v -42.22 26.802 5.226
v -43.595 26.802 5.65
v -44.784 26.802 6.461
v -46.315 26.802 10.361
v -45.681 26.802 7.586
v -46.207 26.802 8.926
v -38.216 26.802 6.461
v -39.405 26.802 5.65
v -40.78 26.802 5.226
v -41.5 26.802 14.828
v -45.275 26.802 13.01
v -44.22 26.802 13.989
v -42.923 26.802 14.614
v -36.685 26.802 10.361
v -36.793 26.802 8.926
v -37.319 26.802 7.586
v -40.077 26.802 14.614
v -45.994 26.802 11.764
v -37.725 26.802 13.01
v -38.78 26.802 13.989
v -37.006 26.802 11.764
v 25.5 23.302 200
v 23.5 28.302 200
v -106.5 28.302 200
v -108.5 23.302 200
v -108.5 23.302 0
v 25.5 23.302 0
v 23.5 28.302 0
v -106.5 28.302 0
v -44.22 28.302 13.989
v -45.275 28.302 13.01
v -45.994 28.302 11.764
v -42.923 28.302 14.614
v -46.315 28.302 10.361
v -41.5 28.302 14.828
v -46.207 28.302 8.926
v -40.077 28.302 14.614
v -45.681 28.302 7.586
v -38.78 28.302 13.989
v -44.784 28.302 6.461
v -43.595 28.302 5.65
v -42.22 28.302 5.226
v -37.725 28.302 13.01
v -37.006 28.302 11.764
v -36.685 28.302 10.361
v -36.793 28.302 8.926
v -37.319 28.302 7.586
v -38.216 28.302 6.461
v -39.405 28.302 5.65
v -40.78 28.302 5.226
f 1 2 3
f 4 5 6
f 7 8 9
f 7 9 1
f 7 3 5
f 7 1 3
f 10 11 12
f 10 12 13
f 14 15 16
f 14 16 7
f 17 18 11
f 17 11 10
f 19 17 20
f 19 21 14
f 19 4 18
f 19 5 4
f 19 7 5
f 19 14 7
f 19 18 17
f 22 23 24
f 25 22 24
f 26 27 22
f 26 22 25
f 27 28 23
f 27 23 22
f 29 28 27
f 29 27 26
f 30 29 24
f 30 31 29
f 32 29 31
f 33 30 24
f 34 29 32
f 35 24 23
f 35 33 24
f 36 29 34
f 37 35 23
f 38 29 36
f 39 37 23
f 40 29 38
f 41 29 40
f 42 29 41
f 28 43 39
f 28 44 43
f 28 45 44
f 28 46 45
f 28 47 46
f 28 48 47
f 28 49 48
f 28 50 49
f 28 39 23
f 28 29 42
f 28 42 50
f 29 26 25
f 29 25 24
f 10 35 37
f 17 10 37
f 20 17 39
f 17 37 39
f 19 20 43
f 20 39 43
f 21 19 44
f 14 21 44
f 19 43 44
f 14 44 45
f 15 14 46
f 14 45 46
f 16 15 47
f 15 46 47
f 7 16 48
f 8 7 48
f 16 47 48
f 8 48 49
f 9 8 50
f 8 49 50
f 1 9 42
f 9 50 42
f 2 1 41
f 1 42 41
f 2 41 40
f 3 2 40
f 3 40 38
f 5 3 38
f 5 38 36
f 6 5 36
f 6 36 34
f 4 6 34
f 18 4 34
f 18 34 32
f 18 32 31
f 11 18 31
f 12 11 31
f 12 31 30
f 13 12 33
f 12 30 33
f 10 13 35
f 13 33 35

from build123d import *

# Parameters (mm, degrees)
BOSS_EXTRUDE1_DEPTH = 200
SKETCH2_R           = 4.828226571
CUT_EXTRUDE1_DEPTH  = 1.5


with BuildPart() as part:
    # Sketch1 → Boss-Extrude1 (new body)
    with BuildSketch(Plane.XY):
        Polygon((-106.5, 28.302180685), (23.5, 28.302180685), (25.5, 23.302180685), (-108.5, 23.302180685), align=None)
    extrude(amount=BOSS_EXTRUDE1_DEPTH)

    # Sketch2 → Cut-Extrude1 (cut)
    with BuildSketch(Plane(origin=(0, 28.302180685, 0), x_dir=(1, 0, 0), z_dir=(0, 1, 0))):
        with Locations(Location((-41.5, -10, 0), (0, 0, 270))):
            Circle(SKETCH2_R)
    extrude(amount=-CUT_EXTRUDE1_DEPTH, mode=Mode.SUBTRACT)


solid = part.part
